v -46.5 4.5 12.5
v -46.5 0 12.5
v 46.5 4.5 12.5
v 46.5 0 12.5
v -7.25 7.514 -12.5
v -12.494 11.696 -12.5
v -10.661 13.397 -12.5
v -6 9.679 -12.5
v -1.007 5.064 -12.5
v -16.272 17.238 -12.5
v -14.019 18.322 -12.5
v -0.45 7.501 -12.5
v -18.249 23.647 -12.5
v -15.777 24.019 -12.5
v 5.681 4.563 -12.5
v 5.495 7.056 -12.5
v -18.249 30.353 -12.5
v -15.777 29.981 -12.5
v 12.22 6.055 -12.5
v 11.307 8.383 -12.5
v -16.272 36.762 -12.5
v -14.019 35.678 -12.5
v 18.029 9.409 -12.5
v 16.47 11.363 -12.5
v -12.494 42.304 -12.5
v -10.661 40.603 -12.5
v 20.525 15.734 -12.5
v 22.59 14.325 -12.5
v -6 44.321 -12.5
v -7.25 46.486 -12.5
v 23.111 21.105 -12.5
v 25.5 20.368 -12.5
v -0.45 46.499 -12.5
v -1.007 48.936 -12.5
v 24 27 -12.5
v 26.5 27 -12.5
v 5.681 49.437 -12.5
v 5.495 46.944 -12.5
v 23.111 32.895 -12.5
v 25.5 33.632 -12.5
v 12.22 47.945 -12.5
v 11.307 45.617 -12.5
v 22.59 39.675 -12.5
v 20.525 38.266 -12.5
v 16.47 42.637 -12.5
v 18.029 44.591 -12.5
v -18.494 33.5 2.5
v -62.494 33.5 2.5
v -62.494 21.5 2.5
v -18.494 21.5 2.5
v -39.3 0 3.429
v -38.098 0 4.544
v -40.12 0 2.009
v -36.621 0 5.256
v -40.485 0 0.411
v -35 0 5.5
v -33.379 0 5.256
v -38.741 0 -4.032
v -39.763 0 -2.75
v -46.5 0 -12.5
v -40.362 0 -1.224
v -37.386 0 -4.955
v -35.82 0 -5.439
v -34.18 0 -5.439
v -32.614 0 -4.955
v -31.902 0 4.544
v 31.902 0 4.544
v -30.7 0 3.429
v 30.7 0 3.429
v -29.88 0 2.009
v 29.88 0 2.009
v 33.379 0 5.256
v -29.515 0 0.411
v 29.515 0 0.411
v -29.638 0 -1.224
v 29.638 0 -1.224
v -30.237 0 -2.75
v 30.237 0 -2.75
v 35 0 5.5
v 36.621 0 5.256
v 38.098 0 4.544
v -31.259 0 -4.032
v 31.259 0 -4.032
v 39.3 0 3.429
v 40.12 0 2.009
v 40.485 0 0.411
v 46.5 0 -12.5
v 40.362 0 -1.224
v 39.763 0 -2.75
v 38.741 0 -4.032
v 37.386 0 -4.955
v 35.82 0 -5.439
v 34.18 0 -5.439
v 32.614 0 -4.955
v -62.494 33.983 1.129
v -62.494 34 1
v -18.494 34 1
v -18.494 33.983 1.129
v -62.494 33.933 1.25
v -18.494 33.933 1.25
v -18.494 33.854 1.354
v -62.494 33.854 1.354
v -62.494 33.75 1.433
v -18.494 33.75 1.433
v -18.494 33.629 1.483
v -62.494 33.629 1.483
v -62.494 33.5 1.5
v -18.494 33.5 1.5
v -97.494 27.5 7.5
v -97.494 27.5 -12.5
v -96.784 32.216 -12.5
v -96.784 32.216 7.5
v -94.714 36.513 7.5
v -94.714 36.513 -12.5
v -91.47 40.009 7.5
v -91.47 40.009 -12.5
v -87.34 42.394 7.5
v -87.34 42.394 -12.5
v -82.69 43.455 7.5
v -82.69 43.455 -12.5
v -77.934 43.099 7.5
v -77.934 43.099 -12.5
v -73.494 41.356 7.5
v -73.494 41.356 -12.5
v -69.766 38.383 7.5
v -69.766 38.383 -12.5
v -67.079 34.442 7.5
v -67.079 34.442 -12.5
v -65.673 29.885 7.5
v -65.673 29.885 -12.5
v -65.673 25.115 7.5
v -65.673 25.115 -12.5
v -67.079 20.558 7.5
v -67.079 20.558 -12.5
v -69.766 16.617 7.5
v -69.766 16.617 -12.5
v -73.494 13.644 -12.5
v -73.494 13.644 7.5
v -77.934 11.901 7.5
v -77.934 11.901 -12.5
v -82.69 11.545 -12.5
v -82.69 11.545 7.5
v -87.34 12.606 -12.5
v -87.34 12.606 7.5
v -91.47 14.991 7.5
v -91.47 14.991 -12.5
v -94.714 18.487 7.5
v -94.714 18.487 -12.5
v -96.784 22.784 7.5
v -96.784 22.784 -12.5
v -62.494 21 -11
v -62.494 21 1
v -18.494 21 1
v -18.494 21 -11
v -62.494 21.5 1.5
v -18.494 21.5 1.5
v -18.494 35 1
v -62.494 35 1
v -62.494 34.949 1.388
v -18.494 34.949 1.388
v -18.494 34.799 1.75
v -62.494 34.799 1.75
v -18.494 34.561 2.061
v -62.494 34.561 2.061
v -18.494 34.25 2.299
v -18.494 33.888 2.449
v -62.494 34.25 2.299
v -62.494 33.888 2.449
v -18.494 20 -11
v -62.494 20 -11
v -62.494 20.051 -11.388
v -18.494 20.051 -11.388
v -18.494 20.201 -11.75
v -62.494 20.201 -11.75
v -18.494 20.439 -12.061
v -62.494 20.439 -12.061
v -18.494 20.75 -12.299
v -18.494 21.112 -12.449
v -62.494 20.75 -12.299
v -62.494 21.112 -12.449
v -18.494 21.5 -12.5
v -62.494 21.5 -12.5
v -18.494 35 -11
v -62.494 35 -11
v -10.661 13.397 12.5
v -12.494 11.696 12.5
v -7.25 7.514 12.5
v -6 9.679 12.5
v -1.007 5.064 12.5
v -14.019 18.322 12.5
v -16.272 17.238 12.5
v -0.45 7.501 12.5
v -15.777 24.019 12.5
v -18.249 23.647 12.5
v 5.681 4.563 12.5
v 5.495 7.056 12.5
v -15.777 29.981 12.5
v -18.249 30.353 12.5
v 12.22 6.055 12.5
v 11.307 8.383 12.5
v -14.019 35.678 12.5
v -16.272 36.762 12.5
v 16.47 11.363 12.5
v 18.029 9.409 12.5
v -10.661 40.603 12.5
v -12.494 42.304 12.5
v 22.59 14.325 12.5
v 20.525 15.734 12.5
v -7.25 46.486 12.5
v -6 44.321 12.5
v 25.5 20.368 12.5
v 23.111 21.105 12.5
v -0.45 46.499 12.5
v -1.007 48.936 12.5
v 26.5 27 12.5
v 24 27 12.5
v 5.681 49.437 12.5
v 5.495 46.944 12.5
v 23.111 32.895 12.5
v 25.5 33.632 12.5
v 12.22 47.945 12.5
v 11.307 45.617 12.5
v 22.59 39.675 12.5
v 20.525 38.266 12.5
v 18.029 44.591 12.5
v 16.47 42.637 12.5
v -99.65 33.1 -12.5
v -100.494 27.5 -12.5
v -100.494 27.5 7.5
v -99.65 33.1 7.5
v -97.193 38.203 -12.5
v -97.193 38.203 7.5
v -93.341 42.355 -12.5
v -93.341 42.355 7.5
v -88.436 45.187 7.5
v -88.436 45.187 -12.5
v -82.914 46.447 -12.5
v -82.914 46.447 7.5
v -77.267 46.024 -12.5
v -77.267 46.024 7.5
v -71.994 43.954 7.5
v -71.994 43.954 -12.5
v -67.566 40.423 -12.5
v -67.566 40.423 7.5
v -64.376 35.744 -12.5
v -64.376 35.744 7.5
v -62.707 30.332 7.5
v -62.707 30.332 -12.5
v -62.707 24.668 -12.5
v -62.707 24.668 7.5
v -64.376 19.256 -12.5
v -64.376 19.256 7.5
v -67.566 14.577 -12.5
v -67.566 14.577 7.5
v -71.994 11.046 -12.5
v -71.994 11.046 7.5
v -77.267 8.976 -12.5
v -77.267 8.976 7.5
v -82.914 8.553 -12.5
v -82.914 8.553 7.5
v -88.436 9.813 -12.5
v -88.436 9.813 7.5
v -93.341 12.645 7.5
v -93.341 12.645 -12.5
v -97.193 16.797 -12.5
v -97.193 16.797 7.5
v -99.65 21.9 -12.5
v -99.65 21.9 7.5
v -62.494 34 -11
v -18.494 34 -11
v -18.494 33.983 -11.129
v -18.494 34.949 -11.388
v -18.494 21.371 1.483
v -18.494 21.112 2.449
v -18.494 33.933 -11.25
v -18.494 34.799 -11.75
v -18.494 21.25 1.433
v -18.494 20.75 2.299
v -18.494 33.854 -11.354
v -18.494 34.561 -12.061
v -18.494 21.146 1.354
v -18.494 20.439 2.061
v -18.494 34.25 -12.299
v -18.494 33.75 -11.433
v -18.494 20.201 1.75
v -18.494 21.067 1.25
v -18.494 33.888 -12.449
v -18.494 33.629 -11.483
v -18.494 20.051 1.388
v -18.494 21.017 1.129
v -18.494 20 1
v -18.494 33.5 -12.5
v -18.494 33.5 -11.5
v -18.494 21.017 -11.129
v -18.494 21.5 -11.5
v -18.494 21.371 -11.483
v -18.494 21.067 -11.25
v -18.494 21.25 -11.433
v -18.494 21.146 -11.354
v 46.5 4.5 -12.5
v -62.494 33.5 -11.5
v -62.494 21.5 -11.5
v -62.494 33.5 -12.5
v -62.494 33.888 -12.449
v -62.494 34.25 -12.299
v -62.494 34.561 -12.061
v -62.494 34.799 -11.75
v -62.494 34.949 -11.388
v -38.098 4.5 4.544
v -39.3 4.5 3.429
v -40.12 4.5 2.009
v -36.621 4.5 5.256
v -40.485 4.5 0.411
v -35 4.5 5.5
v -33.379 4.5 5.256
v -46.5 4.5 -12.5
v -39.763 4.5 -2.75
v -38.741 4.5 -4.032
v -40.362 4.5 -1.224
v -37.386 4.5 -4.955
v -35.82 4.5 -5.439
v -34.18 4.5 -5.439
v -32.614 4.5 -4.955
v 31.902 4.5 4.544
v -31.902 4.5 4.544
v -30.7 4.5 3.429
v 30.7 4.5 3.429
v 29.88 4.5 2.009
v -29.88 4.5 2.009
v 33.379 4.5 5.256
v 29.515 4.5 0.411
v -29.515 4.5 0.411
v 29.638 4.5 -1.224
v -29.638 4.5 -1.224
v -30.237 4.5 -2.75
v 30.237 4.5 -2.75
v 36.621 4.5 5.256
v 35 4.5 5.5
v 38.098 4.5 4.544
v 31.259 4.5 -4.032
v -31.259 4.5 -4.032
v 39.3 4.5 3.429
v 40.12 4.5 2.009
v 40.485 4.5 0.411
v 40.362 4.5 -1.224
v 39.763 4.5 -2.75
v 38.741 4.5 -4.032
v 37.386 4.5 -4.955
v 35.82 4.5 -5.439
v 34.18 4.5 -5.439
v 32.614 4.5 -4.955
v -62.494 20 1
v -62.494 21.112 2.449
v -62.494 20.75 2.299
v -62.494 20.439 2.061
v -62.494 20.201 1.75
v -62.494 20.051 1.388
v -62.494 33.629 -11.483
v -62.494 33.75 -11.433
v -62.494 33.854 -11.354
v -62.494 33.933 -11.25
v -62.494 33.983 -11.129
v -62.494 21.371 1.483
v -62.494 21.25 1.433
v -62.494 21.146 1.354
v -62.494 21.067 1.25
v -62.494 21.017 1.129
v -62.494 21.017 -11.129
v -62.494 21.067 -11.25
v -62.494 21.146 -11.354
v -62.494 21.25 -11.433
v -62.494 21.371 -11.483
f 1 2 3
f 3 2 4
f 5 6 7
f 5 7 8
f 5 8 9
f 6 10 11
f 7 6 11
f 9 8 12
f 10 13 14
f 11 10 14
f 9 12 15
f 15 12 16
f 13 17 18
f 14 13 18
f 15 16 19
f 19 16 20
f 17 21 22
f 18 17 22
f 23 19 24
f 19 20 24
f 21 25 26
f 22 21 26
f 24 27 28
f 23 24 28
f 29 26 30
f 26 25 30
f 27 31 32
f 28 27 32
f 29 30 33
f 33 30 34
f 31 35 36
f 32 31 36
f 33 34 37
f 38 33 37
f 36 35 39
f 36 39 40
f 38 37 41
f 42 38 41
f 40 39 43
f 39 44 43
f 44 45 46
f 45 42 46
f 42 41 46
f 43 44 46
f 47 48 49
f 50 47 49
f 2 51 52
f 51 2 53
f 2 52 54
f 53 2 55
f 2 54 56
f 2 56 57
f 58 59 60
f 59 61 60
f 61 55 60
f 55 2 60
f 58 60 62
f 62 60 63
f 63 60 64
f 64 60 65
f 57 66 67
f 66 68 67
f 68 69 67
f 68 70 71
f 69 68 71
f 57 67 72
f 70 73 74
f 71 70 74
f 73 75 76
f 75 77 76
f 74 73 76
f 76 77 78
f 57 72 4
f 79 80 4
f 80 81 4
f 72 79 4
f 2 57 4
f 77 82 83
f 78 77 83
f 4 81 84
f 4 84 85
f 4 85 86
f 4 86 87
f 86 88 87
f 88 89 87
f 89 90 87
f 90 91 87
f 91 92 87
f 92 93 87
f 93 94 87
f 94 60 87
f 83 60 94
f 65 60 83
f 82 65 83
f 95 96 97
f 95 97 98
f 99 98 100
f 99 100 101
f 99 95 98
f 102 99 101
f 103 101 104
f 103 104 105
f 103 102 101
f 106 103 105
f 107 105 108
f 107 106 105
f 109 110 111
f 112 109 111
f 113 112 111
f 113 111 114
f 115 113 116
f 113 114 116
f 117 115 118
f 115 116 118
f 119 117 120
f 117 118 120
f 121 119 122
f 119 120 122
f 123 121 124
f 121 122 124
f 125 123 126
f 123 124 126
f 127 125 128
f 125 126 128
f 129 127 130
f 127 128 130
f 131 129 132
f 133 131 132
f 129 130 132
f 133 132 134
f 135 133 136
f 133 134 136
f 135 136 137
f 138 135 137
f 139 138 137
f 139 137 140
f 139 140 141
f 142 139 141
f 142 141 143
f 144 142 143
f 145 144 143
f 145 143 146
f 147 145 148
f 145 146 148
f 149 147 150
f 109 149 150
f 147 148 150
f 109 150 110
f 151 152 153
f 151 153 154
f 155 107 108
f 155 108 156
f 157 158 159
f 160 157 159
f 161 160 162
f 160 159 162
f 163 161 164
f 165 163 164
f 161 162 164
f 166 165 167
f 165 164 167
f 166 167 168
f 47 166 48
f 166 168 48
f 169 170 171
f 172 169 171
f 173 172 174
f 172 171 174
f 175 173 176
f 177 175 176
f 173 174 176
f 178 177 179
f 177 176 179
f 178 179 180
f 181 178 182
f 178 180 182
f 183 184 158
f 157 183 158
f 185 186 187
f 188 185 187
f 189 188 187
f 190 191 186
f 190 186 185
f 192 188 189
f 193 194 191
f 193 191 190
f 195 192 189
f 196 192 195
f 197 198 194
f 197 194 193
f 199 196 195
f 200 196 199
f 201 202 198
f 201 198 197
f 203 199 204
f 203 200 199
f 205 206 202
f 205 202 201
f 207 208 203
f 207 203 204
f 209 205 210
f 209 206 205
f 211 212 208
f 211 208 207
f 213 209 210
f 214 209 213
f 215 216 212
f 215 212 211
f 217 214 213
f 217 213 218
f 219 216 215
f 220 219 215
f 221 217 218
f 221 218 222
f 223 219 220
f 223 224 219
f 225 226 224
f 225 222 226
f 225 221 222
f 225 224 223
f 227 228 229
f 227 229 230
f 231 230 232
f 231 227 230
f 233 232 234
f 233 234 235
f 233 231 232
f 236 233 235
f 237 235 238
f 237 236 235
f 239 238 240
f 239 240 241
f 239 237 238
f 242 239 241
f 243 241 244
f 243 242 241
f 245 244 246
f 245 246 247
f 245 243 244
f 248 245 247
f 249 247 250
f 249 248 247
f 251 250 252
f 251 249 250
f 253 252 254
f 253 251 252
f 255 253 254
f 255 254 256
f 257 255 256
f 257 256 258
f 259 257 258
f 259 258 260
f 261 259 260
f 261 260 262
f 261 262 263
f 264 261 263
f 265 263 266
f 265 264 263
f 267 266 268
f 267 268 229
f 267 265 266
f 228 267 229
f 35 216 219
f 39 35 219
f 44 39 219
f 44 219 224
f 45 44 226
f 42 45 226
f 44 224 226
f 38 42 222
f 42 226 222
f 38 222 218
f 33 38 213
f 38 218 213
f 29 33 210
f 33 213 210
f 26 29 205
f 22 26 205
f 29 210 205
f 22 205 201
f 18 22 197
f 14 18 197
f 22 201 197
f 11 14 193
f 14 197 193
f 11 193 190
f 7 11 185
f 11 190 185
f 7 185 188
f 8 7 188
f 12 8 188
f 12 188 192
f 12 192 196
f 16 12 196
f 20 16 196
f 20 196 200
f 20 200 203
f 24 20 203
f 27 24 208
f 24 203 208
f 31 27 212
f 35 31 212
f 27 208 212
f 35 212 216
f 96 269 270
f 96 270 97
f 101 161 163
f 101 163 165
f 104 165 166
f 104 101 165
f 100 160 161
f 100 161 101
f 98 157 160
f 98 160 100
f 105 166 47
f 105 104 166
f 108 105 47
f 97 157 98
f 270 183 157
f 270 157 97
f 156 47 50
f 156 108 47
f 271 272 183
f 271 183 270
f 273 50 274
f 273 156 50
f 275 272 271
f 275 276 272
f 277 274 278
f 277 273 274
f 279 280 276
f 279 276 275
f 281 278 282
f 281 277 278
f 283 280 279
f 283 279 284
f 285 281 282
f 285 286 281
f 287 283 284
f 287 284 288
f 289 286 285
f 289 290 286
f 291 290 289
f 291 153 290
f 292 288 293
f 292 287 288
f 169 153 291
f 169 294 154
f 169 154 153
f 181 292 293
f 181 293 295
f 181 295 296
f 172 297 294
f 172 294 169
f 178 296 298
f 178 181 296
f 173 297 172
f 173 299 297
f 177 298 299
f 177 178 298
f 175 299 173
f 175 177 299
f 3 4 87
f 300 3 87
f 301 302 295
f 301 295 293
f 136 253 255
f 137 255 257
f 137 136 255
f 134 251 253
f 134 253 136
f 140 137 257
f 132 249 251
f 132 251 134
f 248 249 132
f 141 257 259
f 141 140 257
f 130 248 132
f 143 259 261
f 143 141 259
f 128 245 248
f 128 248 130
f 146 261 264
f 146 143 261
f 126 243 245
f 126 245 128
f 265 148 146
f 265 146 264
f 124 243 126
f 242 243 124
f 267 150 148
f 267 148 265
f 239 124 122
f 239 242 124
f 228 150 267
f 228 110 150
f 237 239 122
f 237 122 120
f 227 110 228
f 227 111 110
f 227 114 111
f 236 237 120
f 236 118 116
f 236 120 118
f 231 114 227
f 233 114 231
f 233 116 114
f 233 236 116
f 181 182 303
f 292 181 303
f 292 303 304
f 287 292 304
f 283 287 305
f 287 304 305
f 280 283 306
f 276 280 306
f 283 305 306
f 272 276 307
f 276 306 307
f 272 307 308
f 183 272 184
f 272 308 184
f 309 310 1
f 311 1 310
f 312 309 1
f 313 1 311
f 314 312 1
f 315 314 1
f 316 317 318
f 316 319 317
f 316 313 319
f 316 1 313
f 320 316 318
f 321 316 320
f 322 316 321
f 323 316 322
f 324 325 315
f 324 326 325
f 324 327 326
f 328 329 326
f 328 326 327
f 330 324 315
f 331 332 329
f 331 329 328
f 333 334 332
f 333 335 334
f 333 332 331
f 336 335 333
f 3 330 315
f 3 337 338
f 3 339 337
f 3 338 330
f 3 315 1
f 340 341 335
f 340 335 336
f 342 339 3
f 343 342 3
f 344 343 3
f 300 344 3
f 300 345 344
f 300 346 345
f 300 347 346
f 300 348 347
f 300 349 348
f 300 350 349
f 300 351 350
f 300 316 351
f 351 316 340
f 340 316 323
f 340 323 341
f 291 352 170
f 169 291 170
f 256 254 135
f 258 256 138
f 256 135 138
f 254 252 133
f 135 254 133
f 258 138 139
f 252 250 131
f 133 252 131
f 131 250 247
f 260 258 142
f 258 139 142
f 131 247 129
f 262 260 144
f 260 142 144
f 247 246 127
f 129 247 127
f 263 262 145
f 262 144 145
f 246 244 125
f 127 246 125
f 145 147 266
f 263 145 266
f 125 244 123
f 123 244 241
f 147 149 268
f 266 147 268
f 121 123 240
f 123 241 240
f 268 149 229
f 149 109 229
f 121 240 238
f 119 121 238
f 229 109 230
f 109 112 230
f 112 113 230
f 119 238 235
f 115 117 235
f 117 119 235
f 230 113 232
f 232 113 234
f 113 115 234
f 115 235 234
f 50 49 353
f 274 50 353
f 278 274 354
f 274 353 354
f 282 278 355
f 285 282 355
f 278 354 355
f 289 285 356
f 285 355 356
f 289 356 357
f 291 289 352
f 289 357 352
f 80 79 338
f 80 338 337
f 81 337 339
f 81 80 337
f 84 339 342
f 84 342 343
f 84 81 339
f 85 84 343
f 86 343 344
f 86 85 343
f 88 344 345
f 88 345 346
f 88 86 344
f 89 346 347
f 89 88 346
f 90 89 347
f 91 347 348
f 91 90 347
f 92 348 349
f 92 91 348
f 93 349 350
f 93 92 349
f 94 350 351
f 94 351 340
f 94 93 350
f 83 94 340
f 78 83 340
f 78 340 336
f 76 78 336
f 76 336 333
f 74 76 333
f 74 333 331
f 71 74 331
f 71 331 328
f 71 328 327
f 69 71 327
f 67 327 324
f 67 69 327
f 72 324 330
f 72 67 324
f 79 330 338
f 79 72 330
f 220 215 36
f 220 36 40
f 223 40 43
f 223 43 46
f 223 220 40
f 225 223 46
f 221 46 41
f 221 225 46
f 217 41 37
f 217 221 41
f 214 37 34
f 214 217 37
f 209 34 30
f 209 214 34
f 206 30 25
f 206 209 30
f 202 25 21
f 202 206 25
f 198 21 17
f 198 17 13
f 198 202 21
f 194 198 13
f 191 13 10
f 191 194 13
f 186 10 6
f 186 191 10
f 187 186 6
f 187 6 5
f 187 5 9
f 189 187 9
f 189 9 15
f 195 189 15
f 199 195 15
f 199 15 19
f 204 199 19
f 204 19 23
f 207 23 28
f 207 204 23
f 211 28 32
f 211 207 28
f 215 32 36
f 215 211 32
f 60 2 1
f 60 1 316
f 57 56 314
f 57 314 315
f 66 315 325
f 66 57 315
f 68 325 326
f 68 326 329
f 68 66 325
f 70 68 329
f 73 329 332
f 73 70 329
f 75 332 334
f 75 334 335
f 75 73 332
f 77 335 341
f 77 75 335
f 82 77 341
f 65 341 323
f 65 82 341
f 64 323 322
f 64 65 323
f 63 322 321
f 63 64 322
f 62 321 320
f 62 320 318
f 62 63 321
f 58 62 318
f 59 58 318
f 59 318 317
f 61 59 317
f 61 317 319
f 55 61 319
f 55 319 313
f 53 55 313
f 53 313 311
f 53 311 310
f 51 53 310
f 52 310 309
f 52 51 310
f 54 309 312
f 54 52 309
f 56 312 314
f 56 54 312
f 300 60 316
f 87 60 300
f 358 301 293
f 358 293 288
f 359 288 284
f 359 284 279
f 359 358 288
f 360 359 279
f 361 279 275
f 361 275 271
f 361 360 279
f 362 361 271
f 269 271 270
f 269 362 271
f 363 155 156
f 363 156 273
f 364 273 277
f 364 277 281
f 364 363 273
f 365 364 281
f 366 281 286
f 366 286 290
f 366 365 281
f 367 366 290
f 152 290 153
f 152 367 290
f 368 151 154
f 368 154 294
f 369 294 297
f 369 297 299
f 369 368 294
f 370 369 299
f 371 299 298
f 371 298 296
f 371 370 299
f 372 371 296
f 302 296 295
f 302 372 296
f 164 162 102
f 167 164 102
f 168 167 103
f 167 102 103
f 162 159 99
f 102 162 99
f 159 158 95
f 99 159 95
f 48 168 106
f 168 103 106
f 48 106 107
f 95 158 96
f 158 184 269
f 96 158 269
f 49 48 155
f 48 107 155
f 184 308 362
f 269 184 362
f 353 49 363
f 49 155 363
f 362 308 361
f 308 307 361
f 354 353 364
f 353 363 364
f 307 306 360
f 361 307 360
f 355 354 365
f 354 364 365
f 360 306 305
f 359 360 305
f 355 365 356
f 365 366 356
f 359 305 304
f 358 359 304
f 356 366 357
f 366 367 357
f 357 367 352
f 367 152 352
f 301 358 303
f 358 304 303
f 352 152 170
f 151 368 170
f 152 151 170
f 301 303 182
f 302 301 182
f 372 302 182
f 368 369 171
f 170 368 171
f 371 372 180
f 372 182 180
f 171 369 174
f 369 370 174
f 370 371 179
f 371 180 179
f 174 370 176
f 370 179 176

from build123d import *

# Parameters (mm, degrees)
SKETCH_1_W                        = 93
SKETCH_1_H                        = 25
SKETCH_1_R                        = 5.5
EXTRUDE_1_DEPTH                   = 4.5
SKETCH_2_R                        = 22.5
SKETCH_2_R_2                      = 20
EXTRUDE_2_DEPTH                   = 25
BXBXS_8639_82_15_X_15_X_1_1_DEPTH = 44
SKETCH_7_R                        = 19
SKETCH_7_R_2                      = 16
EXTRUDE_3_DEPTH                   = 20


with BuildPart() as part:
    # Эскиз1 → Бобышка-Вытянуть1 (new body)
    with BuildSketch(Plane(origin=(0, 0, 0), x_dir=(1, 0, 0), z_dir=(0, 1, 0))):
        Rectangle(SKETCH_1_W, SKETCH_1_H)
        with Locations(Location((35, 0, 0), (0, 0, 270))):
            Circle(SKETCH_1_R, mode=Mode.SUBTRACT)
        with Locations(Location((-35, 0, 0), (0, 0, 270))):
            Circle(SKETCH_1_R, mode=Mode.SUBTRACT)
    extrude(amount=EXTRUDE_1_DEPTH)


with BuildPart() as body_2:
    # Эскиз2 → Бобышка-Вытянуть2 (new body)
    with BuildSketch(Plane.XY.offset(12.5)):
        with Locations((4, 27)):
            Circle(SKETCH_2_R)
        with Locations((4, 27)):
            Circle(SKETCH_2_R_2, mode=Mode.SUBTRACT)
    extrude(amount=-EXTRUDE_2_DEPTH)


with BuildPart() as body_3:
    # Sketch1 → Труба bxbxs гост8639-82 15 X 15 X 1(1) (new body)
    with BuildSketch(Plane(origin=(-62.494443758, 27.5, -5), x_dir=(0, -1, 0), z_dir=(1, 0, 0))):
        with BuildLine():
            Line((-6, -7.5), (6, -7.5))
            ThreePointArc((6, -7.5), (7.060660172, -7.060660172), (7.5, -6))
            Line((7.5, -6), (7.5, 6))
            ThreePointArc((7.5, 6), (7.060660172, 7.060660172), (6, 7.5))
            Line((6, 7.5), (-6, 7.5))
            ThreePointArc((-6, 7.5), (-7.060660172, 7.060660172), (-7.5, 6))
            Line((-7.5, 6), (-7.5, -6))
            ThreePointArc((-7.5, -6), (-7.060660172, -7.060660172), (-6, -7.5))
        make_face()
        with BuildLine():
            Line((-6, -6.5), (6, -6.5))
            ThreePointArc((6, -6.5), (6.353553391, -6.353553391), (6.5, -6))
            Line((6.5, -6), (6.5, 6))
            ThreePointArc((6.5, 6), (6.353553391, 6.353553391), (6, 6.5))
            Line((6, 6.5), (-6, 6.5))
            ThreePointArc((-6, 6.5), (-6.353553391, 6.353553391), (-6.5, 6))
            Line((-6.5, 6), (-6.5, -6))
            ThreePointArc((-6.5, -6), (-6.353553391, -6.353553391), (-6, -6.5))
        make_face(mode=Mode.SUBTRACT)
    extrude(amount=BXBXS_8639_82_15_X_15_X_1_1_DEPTH)


with BuildPart() as body_4:
    # Эскиз7 → Бобышка-Вытянуть3 (new body)
    with BuildSketch(Plane(origin=(0, 0, -12.5), x_dir=(-1, 0, 0), z_dir=(0, 0, -1))):
        with Locations((81.494443758, 27.5)):
            Circle(SKETCH_7_R)
        with Locations((81.494443758, 27.5)):
            Circle(SKETCH_7_R_2, mode=Mode.SUBTRACT)
    extrude(amount=-EXTRUDE_3_DEPTH)


solid = Compound([part.part, body_2.part, body_3.part, body_4.part])
